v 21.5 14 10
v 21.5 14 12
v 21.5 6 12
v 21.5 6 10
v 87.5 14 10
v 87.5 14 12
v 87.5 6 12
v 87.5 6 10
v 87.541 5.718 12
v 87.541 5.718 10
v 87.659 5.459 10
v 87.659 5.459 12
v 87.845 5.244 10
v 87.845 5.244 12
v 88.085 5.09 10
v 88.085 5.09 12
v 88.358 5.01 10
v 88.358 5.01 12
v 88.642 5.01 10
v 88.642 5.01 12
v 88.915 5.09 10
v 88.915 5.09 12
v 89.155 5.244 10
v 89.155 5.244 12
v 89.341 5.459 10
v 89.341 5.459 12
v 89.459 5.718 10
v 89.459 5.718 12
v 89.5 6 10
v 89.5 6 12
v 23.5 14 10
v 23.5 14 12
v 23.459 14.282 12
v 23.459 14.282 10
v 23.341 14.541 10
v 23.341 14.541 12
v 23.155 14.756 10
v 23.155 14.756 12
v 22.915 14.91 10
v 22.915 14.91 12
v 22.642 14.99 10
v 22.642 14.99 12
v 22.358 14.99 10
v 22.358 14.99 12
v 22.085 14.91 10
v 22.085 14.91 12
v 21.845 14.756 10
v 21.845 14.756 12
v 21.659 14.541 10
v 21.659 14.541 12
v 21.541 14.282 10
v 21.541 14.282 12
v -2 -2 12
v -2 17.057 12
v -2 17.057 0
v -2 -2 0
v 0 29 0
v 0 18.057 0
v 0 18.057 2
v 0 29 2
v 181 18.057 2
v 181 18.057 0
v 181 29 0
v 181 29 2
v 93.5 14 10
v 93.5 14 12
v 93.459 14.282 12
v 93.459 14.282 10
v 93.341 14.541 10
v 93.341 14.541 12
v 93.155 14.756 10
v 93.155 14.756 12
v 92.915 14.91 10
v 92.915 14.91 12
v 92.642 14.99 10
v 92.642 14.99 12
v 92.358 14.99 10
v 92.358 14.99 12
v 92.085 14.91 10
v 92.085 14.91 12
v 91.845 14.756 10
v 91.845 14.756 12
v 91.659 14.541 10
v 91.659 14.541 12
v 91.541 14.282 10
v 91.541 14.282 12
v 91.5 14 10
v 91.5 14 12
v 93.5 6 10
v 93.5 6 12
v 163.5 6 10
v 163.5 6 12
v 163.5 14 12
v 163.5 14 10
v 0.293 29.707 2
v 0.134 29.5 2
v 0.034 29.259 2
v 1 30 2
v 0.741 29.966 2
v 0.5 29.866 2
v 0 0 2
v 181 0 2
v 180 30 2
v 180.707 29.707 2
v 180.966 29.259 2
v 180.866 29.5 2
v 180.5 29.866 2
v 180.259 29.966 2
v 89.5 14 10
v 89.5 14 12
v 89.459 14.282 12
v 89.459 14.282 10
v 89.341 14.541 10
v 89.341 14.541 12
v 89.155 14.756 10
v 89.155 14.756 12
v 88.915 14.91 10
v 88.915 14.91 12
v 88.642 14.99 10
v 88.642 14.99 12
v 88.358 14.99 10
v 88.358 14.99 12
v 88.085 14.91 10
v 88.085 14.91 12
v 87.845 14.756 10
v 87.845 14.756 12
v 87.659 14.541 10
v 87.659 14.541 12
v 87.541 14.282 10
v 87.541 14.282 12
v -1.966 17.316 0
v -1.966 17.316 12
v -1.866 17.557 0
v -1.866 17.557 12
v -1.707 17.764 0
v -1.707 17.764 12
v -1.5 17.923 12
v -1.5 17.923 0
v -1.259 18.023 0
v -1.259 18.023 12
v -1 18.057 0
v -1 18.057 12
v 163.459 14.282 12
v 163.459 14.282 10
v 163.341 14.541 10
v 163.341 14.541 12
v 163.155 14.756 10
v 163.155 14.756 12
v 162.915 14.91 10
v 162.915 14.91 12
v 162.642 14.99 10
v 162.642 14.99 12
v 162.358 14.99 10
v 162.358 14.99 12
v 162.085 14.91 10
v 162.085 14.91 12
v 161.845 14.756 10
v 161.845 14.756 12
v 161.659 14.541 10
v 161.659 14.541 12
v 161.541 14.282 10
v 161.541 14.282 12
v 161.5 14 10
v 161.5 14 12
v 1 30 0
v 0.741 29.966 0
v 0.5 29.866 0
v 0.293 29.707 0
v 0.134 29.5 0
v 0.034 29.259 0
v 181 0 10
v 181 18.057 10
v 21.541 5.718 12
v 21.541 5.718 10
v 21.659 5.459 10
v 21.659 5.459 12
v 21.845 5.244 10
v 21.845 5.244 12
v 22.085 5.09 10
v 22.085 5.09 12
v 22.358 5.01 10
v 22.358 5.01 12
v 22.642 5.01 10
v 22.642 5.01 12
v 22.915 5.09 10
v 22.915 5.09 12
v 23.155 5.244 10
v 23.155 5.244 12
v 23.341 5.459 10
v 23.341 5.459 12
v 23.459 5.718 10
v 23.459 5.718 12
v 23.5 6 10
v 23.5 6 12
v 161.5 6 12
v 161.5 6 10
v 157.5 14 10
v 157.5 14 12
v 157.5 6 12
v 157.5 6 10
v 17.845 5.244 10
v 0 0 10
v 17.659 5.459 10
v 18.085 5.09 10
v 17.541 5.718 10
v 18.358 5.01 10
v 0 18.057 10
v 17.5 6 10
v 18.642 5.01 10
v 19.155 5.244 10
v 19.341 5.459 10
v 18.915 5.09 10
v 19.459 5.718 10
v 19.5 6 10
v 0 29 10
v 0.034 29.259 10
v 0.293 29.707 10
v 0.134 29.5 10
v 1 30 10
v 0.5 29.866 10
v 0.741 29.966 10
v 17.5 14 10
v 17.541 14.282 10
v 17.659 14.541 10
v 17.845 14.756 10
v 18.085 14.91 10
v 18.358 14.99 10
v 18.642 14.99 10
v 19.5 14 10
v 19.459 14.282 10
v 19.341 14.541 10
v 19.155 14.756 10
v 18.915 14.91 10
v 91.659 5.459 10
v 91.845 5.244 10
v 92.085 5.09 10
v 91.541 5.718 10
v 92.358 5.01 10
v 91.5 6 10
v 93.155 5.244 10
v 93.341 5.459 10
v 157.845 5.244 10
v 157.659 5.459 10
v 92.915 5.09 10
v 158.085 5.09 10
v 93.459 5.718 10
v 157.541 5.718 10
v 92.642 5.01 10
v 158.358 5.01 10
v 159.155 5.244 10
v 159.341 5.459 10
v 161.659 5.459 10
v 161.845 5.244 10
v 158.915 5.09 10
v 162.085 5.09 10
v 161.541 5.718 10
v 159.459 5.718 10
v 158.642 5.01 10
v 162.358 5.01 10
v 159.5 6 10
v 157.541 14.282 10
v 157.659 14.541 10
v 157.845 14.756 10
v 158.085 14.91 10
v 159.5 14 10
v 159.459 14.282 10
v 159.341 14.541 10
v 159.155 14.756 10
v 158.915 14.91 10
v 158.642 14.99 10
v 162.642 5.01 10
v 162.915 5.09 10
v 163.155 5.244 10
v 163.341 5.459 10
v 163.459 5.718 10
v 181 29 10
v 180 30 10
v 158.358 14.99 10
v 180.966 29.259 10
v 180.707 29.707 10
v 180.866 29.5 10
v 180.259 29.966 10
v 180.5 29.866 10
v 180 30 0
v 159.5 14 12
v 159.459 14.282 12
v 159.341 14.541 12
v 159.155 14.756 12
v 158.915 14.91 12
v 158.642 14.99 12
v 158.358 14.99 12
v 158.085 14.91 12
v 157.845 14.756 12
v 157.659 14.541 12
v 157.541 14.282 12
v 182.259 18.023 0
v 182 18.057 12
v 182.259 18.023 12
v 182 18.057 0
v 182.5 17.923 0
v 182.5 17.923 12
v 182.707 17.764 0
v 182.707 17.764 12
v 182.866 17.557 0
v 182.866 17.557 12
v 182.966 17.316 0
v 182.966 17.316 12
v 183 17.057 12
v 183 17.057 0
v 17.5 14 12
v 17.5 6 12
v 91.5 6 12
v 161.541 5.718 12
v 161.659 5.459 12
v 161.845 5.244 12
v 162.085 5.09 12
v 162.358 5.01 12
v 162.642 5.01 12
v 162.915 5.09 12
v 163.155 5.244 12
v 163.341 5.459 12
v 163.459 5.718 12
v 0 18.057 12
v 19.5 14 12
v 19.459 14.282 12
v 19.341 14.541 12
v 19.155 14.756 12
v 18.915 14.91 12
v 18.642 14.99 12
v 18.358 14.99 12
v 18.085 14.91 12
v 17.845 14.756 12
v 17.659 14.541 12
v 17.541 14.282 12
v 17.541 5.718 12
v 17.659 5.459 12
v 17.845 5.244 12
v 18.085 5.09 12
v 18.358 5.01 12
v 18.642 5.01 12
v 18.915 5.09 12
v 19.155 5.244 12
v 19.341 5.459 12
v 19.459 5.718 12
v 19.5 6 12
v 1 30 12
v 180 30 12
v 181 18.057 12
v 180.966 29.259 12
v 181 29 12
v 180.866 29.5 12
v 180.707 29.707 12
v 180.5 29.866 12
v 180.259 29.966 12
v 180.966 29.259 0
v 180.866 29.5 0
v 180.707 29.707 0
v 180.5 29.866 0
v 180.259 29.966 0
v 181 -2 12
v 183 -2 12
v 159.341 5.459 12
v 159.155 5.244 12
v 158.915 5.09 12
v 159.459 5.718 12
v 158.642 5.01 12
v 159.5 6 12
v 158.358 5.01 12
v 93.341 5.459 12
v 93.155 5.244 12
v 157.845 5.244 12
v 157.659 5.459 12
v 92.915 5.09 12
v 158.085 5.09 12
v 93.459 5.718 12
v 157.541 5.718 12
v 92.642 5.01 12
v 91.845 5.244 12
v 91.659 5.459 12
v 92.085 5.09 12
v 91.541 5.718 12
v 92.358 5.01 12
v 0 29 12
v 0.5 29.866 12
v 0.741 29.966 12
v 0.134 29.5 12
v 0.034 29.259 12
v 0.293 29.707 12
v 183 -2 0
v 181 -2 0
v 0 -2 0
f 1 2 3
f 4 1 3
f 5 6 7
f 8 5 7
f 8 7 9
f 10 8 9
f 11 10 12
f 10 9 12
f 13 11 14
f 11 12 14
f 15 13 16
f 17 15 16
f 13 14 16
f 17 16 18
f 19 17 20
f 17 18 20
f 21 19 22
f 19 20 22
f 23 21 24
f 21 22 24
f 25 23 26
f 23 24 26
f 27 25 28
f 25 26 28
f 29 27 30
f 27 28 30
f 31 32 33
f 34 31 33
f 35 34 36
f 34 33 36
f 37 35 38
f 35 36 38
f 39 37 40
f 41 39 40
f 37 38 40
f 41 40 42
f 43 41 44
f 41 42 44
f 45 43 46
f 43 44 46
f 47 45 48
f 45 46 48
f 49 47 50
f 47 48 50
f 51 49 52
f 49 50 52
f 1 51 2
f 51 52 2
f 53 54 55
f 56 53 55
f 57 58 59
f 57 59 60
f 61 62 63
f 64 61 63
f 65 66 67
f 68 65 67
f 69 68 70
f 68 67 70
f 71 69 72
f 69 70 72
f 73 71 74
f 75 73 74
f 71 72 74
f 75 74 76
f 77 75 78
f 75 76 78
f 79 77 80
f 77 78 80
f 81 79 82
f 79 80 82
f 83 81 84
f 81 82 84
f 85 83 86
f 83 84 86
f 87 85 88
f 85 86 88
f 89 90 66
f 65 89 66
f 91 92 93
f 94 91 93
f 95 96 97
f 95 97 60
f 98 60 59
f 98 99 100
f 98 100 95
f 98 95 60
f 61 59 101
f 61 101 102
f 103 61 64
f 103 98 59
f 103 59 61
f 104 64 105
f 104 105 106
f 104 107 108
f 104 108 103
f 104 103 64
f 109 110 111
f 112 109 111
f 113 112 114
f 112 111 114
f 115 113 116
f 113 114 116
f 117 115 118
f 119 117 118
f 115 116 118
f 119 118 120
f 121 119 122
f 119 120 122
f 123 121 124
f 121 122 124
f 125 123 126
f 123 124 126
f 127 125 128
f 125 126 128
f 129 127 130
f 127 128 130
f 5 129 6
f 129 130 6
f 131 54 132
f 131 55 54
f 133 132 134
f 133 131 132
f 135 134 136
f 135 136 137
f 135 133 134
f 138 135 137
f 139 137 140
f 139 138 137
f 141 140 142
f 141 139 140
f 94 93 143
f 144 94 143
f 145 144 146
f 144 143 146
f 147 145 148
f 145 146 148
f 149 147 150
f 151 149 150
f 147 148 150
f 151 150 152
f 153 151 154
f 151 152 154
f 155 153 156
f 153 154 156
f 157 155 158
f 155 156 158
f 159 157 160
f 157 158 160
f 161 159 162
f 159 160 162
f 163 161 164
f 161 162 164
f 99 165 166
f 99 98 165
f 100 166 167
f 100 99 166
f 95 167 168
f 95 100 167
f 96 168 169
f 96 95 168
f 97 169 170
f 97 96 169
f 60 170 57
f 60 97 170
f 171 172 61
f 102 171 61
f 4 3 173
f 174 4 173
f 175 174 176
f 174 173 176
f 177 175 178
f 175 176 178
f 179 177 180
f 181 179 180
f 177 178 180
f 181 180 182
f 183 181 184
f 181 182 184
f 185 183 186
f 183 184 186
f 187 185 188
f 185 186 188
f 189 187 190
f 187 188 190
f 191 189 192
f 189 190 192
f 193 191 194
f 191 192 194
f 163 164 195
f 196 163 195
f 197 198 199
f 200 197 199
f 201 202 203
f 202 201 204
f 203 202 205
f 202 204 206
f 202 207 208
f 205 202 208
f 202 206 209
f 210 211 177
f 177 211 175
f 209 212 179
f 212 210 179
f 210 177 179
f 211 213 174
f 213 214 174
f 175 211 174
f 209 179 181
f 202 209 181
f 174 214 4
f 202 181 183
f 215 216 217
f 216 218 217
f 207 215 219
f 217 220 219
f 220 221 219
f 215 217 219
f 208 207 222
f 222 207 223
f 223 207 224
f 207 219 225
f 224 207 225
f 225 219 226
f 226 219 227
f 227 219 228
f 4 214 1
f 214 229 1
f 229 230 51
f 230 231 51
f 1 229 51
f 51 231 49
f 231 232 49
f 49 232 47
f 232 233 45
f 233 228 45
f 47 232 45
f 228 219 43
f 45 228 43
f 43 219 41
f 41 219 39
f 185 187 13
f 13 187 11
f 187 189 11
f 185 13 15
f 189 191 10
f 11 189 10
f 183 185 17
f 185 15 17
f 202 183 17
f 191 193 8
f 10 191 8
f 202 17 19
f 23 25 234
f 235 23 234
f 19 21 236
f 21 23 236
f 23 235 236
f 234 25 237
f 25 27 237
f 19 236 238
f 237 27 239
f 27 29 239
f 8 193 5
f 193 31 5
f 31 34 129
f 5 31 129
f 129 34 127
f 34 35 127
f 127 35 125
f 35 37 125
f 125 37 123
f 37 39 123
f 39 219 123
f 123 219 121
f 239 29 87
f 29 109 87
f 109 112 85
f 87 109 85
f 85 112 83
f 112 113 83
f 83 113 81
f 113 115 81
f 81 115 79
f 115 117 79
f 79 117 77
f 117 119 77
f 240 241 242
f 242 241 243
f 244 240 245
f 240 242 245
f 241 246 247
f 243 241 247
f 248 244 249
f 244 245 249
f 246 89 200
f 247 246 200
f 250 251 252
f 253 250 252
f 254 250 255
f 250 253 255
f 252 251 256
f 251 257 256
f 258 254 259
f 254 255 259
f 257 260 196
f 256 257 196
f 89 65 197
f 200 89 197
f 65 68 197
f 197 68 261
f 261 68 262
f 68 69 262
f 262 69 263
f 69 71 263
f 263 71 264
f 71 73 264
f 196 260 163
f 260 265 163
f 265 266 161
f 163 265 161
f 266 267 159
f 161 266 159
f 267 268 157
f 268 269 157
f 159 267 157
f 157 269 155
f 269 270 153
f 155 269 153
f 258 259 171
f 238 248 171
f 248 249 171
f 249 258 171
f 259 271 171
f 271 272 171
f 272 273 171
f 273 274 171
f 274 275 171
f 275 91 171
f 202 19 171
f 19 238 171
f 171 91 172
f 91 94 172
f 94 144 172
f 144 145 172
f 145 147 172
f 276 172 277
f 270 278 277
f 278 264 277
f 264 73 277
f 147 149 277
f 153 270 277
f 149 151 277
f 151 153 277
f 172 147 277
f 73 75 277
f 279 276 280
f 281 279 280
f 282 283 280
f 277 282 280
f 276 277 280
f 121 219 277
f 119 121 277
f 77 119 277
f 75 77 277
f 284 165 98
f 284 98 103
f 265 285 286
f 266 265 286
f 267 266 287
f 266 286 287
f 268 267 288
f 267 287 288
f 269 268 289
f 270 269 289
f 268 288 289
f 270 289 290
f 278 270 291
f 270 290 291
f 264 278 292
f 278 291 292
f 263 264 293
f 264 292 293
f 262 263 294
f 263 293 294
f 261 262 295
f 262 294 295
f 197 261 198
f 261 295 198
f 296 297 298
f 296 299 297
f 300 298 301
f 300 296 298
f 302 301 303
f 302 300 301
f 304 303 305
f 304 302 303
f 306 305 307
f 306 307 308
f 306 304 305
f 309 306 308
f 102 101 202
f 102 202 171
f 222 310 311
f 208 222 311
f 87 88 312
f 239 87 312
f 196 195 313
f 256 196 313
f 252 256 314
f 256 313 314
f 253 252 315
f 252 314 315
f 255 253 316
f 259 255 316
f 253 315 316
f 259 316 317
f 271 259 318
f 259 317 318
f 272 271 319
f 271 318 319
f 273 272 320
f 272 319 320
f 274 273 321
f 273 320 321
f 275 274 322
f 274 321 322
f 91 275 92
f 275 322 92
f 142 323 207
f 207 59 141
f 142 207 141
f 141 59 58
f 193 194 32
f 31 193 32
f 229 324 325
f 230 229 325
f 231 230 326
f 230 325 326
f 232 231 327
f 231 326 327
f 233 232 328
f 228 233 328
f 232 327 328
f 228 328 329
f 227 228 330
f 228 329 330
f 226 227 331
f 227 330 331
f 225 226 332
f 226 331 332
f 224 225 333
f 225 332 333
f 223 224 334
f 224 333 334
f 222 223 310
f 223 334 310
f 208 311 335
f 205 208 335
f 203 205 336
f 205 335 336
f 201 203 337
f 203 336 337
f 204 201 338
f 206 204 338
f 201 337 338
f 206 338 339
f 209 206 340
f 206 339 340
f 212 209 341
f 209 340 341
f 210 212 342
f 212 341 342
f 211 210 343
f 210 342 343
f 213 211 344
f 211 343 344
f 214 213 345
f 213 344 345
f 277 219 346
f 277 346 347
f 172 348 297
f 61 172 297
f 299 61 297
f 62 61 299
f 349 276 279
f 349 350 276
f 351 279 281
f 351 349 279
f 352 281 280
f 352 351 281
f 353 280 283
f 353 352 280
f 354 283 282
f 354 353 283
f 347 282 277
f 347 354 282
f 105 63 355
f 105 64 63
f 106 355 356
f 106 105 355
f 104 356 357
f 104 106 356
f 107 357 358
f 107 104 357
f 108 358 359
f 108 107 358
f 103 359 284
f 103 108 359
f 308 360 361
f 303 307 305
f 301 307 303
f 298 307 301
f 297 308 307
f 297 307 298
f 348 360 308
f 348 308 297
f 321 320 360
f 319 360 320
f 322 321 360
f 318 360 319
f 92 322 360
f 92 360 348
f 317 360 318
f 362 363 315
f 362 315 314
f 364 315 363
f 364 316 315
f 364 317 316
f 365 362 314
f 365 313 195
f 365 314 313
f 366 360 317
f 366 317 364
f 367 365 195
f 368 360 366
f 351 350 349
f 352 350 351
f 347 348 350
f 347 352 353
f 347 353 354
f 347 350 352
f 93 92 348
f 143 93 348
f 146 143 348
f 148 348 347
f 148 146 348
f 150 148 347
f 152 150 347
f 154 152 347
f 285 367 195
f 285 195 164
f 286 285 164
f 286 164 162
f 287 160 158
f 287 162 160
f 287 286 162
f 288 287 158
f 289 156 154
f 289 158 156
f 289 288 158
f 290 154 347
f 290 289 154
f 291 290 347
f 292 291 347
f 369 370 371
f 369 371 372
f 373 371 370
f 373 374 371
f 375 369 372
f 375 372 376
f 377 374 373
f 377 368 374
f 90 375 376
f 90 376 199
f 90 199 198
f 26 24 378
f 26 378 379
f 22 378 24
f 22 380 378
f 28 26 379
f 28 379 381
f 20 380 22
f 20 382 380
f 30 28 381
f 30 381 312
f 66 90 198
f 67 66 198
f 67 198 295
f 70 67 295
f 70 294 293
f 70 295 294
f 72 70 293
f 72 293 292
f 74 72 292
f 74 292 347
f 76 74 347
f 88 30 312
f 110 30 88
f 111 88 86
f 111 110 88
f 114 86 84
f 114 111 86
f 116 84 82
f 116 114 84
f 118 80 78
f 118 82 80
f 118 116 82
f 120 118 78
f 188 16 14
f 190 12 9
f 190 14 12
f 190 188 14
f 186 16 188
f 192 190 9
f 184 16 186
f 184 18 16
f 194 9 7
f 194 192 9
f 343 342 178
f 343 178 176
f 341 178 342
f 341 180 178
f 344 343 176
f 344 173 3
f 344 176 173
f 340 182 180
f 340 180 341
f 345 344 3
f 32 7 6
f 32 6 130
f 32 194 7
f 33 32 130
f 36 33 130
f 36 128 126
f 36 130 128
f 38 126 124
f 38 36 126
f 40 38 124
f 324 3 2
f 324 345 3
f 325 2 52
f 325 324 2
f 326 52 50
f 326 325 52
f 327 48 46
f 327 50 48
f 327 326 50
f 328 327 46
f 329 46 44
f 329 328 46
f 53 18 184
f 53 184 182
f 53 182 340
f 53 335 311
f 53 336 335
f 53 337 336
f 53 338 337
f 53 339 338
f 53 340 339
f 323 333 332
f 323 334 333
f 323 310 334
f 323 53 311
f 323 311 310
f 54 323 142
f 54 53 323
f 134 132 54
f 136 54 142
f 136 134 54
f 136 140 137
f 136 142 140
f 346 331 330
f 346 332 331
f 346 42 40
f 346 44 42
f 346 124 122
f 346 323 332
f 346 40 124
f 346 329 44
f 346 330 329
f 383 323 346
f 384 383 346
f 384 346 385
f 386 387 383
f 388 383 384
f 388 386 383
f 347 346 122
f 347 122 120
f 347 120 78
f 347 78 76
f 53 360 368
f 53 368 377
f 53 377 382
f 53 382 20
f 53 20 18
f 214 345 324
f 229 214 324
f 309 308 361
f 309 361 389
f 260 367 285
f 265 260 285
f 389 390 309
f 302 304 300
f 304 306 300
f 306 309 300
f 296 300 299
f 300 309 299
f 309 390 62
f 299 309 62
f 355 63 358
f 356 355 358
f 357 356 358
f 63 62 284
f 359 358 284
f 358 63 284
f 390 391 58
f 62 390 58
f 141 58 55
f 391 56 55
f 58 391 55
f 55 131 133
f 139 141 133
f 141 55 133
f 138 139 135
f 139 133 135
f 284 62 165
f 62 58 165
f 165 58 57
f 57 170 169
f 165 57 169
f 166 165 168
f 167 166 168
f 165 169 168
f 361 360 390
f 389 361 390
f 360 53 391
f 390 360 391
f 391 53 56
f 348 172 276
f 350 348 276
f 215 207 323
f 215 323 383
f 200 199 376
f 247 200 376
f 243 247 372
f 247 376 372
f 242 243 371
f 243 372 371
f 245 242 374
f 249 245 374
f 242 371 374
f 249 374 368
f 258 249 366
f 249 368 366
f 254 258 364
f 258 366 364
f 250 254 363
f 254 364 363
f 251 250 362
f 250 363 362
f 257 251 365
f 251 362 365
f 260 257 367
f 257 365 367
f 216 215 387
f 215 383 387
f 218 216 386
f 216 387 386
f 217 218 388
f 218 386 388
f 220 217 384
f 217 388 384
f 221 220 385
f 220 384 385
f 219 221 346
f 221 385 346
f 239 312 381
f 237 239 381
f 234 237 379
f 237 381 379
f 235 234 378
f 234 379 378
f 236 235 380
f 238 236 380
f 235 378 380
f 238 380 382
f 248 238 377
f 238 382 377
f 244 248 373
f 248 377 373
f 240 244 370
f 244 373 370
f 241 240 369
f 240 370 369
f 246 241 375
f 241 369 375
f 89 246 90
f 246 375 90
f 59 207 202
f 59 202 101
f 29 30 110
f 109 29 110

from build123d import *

# Parameters (mm, degrees)
SKETCH_1_W          = 181
SKETCH_1_H          = 30
EXTRUDE_1_DEPTH     = 2
SKETCH_2_W          = 181
SKETCH_2_H          = 2
EXTRUDE_2_DEPTH     = 10
SKETCH_3_W          = 181
SKETCH_3_H          = 32
EXTRUDE_3_DEPTH     = 2
CUT_EXTRUDE_1_DEPTH = 2
SKETCH_5_W          = 12
SKETCH_5_H          = 20.057389113
EXTRUDE_4_DEPTH     = 2
SKETCH_6_W          = 12
SKETCH_6_H          = 20.057389113
EXTRUDE_5_DEPTH     = 2
FILLET_1_R          = 1


with BuildPart() as part:
    # 草图1 → 凸台-拉伸1 (new body)
    with BuildSketch(Plane.XY):
        with Locations((90.5, 15)):
            Rectangle(SKETCH_1_W, SKETCH_1_H)
    extrude(amount=EXTRUDE_1_DEPTH)

    # 草图2 → 凸台-拉伸2 (add)
    with BuildSketch(Plane.XY):
        with Locations((90.5, -1)):
            Rectangle(SKETCH_2_W, SKETCH_2_H)
    extrude(amount=EXTRUDE_2_DEPTH)

    # 草图3 → 凸台-拉伸3 (add)
    with BuildSketch(Plane.XY.offset(10)):
        with Locations((90.5, 14)):
            Rectangle(SKETCH_3_W, SKETCH_3_H)
    extrude(amount=EXTRUDE_3_DEPTH)

    # 草图4 → 切除-拉伸1 (cut)
    with BuildSketch(Plane.XY.offset(12)):
        with BuildLine():
            Line((19.5, 6), (19.5, 10))
            Line((19.5, 10), (19.5, 14))
            ThreePointArc((19.5, 14), (18.5, 15), (17.5, 14))
            Line((17.5, 14), (17.5, 6))
            ThreePointArc((17.5, 6), (18.5, 5), (19.5, 6))
        make_face()
        with BuildLine():
            Line((21.5, 14), (21.5, 6))
            ThreePointArc((21.5, 6), (22.5, 5), (23.5, 6))
            Line((23.5, 6), (23.5, 14))
            ThreePointArc((23.5, 14), (22.5, 15), (21.5, 14))
        make_face()
        with BuildLine():
            Line((157.5, 14), (157.5, 6))
            ThreePointArc((157.5, 6), (158.5, 5), (159.5, 6))
            Line((159.5, 6), (159.5, 14))
            ThreePointArc((159.5, 14), (158.5, 15), (157.5, 14))
        make_face()
        with BuildLine():
            Line((91.5, 14), (91.5, 6))
            ThreePointArc((91.5, 6), (92.5, 5), (93.5, 6))
            Line((93.5, 6), (93.5, 14))
            ThreePointArc((93.5, 14), (92.5, 15), (91.5, 14))
        make_face()
        with BuildLine():
            Line((87.5, 14), (87.5, 6))
            ThreePointArc((87.5, 6), (88.5, 5), (89.5, 6))
            Line((89.5, 6), (89.5, 14))
            ThreePointArc((89.5, 14), (88.5, 15), (87.5, 14))
        make_face()
        with BuildLine():
            Line((163.5, 6), (163.5, 14))
            ThreePointArc((163.5, 14), (162.5, 15), (161.5, 14))
            Line((161.5, 14), (161.5, 6))
            ThreePointArc((161.5, 6), (162.5, 5), (163.5, 6))
        make_face()
    extrude(amount=-CUT_EXTRUDE_1_DEPTH, mode=Mode.SUBTRACT)

    # 草图5 → 凸台-拉伸4 (add)
    with BuildSketch(Plane(origin=(0, 0, 0), x_dir=(0, 0, -1), z_dir=(1, 0, 0))):
        with Locations((-6, 8.028694557)):
            Rectangle(SKETCH_5_W, SKETCH_5_H)
    extrude(amount=-EXTRUDE_4_DEPTH)

    # 草图6 → 凸台-拉伸5 (add)
    with BuildSketch(Plane(origin=(181, 0, 0), x_dir=(0, 0, -1), z_dir=(1, 0, 0))):
        with Locations((-6, 8.028694557)):
            Rectangle(SKETCH_6_W, SKETCH_6_H)
    extrude(amount=EXTRUDE_5_DEPTH)

    # 圆角1
    fillet_1_edges = [part.edges().sort_by_distance(p)[0] for p in [
        (-2, 18.057389113, 6),
        (183, 18.057389113, 6),
        (181, 30, 11),
        (0, 30, 11),
        (0, 30, 1),
        (181, 30, 1),
    ]]
    fillet(fillet_1_edges, radius=FILLET_1_R)


solid = part.part
